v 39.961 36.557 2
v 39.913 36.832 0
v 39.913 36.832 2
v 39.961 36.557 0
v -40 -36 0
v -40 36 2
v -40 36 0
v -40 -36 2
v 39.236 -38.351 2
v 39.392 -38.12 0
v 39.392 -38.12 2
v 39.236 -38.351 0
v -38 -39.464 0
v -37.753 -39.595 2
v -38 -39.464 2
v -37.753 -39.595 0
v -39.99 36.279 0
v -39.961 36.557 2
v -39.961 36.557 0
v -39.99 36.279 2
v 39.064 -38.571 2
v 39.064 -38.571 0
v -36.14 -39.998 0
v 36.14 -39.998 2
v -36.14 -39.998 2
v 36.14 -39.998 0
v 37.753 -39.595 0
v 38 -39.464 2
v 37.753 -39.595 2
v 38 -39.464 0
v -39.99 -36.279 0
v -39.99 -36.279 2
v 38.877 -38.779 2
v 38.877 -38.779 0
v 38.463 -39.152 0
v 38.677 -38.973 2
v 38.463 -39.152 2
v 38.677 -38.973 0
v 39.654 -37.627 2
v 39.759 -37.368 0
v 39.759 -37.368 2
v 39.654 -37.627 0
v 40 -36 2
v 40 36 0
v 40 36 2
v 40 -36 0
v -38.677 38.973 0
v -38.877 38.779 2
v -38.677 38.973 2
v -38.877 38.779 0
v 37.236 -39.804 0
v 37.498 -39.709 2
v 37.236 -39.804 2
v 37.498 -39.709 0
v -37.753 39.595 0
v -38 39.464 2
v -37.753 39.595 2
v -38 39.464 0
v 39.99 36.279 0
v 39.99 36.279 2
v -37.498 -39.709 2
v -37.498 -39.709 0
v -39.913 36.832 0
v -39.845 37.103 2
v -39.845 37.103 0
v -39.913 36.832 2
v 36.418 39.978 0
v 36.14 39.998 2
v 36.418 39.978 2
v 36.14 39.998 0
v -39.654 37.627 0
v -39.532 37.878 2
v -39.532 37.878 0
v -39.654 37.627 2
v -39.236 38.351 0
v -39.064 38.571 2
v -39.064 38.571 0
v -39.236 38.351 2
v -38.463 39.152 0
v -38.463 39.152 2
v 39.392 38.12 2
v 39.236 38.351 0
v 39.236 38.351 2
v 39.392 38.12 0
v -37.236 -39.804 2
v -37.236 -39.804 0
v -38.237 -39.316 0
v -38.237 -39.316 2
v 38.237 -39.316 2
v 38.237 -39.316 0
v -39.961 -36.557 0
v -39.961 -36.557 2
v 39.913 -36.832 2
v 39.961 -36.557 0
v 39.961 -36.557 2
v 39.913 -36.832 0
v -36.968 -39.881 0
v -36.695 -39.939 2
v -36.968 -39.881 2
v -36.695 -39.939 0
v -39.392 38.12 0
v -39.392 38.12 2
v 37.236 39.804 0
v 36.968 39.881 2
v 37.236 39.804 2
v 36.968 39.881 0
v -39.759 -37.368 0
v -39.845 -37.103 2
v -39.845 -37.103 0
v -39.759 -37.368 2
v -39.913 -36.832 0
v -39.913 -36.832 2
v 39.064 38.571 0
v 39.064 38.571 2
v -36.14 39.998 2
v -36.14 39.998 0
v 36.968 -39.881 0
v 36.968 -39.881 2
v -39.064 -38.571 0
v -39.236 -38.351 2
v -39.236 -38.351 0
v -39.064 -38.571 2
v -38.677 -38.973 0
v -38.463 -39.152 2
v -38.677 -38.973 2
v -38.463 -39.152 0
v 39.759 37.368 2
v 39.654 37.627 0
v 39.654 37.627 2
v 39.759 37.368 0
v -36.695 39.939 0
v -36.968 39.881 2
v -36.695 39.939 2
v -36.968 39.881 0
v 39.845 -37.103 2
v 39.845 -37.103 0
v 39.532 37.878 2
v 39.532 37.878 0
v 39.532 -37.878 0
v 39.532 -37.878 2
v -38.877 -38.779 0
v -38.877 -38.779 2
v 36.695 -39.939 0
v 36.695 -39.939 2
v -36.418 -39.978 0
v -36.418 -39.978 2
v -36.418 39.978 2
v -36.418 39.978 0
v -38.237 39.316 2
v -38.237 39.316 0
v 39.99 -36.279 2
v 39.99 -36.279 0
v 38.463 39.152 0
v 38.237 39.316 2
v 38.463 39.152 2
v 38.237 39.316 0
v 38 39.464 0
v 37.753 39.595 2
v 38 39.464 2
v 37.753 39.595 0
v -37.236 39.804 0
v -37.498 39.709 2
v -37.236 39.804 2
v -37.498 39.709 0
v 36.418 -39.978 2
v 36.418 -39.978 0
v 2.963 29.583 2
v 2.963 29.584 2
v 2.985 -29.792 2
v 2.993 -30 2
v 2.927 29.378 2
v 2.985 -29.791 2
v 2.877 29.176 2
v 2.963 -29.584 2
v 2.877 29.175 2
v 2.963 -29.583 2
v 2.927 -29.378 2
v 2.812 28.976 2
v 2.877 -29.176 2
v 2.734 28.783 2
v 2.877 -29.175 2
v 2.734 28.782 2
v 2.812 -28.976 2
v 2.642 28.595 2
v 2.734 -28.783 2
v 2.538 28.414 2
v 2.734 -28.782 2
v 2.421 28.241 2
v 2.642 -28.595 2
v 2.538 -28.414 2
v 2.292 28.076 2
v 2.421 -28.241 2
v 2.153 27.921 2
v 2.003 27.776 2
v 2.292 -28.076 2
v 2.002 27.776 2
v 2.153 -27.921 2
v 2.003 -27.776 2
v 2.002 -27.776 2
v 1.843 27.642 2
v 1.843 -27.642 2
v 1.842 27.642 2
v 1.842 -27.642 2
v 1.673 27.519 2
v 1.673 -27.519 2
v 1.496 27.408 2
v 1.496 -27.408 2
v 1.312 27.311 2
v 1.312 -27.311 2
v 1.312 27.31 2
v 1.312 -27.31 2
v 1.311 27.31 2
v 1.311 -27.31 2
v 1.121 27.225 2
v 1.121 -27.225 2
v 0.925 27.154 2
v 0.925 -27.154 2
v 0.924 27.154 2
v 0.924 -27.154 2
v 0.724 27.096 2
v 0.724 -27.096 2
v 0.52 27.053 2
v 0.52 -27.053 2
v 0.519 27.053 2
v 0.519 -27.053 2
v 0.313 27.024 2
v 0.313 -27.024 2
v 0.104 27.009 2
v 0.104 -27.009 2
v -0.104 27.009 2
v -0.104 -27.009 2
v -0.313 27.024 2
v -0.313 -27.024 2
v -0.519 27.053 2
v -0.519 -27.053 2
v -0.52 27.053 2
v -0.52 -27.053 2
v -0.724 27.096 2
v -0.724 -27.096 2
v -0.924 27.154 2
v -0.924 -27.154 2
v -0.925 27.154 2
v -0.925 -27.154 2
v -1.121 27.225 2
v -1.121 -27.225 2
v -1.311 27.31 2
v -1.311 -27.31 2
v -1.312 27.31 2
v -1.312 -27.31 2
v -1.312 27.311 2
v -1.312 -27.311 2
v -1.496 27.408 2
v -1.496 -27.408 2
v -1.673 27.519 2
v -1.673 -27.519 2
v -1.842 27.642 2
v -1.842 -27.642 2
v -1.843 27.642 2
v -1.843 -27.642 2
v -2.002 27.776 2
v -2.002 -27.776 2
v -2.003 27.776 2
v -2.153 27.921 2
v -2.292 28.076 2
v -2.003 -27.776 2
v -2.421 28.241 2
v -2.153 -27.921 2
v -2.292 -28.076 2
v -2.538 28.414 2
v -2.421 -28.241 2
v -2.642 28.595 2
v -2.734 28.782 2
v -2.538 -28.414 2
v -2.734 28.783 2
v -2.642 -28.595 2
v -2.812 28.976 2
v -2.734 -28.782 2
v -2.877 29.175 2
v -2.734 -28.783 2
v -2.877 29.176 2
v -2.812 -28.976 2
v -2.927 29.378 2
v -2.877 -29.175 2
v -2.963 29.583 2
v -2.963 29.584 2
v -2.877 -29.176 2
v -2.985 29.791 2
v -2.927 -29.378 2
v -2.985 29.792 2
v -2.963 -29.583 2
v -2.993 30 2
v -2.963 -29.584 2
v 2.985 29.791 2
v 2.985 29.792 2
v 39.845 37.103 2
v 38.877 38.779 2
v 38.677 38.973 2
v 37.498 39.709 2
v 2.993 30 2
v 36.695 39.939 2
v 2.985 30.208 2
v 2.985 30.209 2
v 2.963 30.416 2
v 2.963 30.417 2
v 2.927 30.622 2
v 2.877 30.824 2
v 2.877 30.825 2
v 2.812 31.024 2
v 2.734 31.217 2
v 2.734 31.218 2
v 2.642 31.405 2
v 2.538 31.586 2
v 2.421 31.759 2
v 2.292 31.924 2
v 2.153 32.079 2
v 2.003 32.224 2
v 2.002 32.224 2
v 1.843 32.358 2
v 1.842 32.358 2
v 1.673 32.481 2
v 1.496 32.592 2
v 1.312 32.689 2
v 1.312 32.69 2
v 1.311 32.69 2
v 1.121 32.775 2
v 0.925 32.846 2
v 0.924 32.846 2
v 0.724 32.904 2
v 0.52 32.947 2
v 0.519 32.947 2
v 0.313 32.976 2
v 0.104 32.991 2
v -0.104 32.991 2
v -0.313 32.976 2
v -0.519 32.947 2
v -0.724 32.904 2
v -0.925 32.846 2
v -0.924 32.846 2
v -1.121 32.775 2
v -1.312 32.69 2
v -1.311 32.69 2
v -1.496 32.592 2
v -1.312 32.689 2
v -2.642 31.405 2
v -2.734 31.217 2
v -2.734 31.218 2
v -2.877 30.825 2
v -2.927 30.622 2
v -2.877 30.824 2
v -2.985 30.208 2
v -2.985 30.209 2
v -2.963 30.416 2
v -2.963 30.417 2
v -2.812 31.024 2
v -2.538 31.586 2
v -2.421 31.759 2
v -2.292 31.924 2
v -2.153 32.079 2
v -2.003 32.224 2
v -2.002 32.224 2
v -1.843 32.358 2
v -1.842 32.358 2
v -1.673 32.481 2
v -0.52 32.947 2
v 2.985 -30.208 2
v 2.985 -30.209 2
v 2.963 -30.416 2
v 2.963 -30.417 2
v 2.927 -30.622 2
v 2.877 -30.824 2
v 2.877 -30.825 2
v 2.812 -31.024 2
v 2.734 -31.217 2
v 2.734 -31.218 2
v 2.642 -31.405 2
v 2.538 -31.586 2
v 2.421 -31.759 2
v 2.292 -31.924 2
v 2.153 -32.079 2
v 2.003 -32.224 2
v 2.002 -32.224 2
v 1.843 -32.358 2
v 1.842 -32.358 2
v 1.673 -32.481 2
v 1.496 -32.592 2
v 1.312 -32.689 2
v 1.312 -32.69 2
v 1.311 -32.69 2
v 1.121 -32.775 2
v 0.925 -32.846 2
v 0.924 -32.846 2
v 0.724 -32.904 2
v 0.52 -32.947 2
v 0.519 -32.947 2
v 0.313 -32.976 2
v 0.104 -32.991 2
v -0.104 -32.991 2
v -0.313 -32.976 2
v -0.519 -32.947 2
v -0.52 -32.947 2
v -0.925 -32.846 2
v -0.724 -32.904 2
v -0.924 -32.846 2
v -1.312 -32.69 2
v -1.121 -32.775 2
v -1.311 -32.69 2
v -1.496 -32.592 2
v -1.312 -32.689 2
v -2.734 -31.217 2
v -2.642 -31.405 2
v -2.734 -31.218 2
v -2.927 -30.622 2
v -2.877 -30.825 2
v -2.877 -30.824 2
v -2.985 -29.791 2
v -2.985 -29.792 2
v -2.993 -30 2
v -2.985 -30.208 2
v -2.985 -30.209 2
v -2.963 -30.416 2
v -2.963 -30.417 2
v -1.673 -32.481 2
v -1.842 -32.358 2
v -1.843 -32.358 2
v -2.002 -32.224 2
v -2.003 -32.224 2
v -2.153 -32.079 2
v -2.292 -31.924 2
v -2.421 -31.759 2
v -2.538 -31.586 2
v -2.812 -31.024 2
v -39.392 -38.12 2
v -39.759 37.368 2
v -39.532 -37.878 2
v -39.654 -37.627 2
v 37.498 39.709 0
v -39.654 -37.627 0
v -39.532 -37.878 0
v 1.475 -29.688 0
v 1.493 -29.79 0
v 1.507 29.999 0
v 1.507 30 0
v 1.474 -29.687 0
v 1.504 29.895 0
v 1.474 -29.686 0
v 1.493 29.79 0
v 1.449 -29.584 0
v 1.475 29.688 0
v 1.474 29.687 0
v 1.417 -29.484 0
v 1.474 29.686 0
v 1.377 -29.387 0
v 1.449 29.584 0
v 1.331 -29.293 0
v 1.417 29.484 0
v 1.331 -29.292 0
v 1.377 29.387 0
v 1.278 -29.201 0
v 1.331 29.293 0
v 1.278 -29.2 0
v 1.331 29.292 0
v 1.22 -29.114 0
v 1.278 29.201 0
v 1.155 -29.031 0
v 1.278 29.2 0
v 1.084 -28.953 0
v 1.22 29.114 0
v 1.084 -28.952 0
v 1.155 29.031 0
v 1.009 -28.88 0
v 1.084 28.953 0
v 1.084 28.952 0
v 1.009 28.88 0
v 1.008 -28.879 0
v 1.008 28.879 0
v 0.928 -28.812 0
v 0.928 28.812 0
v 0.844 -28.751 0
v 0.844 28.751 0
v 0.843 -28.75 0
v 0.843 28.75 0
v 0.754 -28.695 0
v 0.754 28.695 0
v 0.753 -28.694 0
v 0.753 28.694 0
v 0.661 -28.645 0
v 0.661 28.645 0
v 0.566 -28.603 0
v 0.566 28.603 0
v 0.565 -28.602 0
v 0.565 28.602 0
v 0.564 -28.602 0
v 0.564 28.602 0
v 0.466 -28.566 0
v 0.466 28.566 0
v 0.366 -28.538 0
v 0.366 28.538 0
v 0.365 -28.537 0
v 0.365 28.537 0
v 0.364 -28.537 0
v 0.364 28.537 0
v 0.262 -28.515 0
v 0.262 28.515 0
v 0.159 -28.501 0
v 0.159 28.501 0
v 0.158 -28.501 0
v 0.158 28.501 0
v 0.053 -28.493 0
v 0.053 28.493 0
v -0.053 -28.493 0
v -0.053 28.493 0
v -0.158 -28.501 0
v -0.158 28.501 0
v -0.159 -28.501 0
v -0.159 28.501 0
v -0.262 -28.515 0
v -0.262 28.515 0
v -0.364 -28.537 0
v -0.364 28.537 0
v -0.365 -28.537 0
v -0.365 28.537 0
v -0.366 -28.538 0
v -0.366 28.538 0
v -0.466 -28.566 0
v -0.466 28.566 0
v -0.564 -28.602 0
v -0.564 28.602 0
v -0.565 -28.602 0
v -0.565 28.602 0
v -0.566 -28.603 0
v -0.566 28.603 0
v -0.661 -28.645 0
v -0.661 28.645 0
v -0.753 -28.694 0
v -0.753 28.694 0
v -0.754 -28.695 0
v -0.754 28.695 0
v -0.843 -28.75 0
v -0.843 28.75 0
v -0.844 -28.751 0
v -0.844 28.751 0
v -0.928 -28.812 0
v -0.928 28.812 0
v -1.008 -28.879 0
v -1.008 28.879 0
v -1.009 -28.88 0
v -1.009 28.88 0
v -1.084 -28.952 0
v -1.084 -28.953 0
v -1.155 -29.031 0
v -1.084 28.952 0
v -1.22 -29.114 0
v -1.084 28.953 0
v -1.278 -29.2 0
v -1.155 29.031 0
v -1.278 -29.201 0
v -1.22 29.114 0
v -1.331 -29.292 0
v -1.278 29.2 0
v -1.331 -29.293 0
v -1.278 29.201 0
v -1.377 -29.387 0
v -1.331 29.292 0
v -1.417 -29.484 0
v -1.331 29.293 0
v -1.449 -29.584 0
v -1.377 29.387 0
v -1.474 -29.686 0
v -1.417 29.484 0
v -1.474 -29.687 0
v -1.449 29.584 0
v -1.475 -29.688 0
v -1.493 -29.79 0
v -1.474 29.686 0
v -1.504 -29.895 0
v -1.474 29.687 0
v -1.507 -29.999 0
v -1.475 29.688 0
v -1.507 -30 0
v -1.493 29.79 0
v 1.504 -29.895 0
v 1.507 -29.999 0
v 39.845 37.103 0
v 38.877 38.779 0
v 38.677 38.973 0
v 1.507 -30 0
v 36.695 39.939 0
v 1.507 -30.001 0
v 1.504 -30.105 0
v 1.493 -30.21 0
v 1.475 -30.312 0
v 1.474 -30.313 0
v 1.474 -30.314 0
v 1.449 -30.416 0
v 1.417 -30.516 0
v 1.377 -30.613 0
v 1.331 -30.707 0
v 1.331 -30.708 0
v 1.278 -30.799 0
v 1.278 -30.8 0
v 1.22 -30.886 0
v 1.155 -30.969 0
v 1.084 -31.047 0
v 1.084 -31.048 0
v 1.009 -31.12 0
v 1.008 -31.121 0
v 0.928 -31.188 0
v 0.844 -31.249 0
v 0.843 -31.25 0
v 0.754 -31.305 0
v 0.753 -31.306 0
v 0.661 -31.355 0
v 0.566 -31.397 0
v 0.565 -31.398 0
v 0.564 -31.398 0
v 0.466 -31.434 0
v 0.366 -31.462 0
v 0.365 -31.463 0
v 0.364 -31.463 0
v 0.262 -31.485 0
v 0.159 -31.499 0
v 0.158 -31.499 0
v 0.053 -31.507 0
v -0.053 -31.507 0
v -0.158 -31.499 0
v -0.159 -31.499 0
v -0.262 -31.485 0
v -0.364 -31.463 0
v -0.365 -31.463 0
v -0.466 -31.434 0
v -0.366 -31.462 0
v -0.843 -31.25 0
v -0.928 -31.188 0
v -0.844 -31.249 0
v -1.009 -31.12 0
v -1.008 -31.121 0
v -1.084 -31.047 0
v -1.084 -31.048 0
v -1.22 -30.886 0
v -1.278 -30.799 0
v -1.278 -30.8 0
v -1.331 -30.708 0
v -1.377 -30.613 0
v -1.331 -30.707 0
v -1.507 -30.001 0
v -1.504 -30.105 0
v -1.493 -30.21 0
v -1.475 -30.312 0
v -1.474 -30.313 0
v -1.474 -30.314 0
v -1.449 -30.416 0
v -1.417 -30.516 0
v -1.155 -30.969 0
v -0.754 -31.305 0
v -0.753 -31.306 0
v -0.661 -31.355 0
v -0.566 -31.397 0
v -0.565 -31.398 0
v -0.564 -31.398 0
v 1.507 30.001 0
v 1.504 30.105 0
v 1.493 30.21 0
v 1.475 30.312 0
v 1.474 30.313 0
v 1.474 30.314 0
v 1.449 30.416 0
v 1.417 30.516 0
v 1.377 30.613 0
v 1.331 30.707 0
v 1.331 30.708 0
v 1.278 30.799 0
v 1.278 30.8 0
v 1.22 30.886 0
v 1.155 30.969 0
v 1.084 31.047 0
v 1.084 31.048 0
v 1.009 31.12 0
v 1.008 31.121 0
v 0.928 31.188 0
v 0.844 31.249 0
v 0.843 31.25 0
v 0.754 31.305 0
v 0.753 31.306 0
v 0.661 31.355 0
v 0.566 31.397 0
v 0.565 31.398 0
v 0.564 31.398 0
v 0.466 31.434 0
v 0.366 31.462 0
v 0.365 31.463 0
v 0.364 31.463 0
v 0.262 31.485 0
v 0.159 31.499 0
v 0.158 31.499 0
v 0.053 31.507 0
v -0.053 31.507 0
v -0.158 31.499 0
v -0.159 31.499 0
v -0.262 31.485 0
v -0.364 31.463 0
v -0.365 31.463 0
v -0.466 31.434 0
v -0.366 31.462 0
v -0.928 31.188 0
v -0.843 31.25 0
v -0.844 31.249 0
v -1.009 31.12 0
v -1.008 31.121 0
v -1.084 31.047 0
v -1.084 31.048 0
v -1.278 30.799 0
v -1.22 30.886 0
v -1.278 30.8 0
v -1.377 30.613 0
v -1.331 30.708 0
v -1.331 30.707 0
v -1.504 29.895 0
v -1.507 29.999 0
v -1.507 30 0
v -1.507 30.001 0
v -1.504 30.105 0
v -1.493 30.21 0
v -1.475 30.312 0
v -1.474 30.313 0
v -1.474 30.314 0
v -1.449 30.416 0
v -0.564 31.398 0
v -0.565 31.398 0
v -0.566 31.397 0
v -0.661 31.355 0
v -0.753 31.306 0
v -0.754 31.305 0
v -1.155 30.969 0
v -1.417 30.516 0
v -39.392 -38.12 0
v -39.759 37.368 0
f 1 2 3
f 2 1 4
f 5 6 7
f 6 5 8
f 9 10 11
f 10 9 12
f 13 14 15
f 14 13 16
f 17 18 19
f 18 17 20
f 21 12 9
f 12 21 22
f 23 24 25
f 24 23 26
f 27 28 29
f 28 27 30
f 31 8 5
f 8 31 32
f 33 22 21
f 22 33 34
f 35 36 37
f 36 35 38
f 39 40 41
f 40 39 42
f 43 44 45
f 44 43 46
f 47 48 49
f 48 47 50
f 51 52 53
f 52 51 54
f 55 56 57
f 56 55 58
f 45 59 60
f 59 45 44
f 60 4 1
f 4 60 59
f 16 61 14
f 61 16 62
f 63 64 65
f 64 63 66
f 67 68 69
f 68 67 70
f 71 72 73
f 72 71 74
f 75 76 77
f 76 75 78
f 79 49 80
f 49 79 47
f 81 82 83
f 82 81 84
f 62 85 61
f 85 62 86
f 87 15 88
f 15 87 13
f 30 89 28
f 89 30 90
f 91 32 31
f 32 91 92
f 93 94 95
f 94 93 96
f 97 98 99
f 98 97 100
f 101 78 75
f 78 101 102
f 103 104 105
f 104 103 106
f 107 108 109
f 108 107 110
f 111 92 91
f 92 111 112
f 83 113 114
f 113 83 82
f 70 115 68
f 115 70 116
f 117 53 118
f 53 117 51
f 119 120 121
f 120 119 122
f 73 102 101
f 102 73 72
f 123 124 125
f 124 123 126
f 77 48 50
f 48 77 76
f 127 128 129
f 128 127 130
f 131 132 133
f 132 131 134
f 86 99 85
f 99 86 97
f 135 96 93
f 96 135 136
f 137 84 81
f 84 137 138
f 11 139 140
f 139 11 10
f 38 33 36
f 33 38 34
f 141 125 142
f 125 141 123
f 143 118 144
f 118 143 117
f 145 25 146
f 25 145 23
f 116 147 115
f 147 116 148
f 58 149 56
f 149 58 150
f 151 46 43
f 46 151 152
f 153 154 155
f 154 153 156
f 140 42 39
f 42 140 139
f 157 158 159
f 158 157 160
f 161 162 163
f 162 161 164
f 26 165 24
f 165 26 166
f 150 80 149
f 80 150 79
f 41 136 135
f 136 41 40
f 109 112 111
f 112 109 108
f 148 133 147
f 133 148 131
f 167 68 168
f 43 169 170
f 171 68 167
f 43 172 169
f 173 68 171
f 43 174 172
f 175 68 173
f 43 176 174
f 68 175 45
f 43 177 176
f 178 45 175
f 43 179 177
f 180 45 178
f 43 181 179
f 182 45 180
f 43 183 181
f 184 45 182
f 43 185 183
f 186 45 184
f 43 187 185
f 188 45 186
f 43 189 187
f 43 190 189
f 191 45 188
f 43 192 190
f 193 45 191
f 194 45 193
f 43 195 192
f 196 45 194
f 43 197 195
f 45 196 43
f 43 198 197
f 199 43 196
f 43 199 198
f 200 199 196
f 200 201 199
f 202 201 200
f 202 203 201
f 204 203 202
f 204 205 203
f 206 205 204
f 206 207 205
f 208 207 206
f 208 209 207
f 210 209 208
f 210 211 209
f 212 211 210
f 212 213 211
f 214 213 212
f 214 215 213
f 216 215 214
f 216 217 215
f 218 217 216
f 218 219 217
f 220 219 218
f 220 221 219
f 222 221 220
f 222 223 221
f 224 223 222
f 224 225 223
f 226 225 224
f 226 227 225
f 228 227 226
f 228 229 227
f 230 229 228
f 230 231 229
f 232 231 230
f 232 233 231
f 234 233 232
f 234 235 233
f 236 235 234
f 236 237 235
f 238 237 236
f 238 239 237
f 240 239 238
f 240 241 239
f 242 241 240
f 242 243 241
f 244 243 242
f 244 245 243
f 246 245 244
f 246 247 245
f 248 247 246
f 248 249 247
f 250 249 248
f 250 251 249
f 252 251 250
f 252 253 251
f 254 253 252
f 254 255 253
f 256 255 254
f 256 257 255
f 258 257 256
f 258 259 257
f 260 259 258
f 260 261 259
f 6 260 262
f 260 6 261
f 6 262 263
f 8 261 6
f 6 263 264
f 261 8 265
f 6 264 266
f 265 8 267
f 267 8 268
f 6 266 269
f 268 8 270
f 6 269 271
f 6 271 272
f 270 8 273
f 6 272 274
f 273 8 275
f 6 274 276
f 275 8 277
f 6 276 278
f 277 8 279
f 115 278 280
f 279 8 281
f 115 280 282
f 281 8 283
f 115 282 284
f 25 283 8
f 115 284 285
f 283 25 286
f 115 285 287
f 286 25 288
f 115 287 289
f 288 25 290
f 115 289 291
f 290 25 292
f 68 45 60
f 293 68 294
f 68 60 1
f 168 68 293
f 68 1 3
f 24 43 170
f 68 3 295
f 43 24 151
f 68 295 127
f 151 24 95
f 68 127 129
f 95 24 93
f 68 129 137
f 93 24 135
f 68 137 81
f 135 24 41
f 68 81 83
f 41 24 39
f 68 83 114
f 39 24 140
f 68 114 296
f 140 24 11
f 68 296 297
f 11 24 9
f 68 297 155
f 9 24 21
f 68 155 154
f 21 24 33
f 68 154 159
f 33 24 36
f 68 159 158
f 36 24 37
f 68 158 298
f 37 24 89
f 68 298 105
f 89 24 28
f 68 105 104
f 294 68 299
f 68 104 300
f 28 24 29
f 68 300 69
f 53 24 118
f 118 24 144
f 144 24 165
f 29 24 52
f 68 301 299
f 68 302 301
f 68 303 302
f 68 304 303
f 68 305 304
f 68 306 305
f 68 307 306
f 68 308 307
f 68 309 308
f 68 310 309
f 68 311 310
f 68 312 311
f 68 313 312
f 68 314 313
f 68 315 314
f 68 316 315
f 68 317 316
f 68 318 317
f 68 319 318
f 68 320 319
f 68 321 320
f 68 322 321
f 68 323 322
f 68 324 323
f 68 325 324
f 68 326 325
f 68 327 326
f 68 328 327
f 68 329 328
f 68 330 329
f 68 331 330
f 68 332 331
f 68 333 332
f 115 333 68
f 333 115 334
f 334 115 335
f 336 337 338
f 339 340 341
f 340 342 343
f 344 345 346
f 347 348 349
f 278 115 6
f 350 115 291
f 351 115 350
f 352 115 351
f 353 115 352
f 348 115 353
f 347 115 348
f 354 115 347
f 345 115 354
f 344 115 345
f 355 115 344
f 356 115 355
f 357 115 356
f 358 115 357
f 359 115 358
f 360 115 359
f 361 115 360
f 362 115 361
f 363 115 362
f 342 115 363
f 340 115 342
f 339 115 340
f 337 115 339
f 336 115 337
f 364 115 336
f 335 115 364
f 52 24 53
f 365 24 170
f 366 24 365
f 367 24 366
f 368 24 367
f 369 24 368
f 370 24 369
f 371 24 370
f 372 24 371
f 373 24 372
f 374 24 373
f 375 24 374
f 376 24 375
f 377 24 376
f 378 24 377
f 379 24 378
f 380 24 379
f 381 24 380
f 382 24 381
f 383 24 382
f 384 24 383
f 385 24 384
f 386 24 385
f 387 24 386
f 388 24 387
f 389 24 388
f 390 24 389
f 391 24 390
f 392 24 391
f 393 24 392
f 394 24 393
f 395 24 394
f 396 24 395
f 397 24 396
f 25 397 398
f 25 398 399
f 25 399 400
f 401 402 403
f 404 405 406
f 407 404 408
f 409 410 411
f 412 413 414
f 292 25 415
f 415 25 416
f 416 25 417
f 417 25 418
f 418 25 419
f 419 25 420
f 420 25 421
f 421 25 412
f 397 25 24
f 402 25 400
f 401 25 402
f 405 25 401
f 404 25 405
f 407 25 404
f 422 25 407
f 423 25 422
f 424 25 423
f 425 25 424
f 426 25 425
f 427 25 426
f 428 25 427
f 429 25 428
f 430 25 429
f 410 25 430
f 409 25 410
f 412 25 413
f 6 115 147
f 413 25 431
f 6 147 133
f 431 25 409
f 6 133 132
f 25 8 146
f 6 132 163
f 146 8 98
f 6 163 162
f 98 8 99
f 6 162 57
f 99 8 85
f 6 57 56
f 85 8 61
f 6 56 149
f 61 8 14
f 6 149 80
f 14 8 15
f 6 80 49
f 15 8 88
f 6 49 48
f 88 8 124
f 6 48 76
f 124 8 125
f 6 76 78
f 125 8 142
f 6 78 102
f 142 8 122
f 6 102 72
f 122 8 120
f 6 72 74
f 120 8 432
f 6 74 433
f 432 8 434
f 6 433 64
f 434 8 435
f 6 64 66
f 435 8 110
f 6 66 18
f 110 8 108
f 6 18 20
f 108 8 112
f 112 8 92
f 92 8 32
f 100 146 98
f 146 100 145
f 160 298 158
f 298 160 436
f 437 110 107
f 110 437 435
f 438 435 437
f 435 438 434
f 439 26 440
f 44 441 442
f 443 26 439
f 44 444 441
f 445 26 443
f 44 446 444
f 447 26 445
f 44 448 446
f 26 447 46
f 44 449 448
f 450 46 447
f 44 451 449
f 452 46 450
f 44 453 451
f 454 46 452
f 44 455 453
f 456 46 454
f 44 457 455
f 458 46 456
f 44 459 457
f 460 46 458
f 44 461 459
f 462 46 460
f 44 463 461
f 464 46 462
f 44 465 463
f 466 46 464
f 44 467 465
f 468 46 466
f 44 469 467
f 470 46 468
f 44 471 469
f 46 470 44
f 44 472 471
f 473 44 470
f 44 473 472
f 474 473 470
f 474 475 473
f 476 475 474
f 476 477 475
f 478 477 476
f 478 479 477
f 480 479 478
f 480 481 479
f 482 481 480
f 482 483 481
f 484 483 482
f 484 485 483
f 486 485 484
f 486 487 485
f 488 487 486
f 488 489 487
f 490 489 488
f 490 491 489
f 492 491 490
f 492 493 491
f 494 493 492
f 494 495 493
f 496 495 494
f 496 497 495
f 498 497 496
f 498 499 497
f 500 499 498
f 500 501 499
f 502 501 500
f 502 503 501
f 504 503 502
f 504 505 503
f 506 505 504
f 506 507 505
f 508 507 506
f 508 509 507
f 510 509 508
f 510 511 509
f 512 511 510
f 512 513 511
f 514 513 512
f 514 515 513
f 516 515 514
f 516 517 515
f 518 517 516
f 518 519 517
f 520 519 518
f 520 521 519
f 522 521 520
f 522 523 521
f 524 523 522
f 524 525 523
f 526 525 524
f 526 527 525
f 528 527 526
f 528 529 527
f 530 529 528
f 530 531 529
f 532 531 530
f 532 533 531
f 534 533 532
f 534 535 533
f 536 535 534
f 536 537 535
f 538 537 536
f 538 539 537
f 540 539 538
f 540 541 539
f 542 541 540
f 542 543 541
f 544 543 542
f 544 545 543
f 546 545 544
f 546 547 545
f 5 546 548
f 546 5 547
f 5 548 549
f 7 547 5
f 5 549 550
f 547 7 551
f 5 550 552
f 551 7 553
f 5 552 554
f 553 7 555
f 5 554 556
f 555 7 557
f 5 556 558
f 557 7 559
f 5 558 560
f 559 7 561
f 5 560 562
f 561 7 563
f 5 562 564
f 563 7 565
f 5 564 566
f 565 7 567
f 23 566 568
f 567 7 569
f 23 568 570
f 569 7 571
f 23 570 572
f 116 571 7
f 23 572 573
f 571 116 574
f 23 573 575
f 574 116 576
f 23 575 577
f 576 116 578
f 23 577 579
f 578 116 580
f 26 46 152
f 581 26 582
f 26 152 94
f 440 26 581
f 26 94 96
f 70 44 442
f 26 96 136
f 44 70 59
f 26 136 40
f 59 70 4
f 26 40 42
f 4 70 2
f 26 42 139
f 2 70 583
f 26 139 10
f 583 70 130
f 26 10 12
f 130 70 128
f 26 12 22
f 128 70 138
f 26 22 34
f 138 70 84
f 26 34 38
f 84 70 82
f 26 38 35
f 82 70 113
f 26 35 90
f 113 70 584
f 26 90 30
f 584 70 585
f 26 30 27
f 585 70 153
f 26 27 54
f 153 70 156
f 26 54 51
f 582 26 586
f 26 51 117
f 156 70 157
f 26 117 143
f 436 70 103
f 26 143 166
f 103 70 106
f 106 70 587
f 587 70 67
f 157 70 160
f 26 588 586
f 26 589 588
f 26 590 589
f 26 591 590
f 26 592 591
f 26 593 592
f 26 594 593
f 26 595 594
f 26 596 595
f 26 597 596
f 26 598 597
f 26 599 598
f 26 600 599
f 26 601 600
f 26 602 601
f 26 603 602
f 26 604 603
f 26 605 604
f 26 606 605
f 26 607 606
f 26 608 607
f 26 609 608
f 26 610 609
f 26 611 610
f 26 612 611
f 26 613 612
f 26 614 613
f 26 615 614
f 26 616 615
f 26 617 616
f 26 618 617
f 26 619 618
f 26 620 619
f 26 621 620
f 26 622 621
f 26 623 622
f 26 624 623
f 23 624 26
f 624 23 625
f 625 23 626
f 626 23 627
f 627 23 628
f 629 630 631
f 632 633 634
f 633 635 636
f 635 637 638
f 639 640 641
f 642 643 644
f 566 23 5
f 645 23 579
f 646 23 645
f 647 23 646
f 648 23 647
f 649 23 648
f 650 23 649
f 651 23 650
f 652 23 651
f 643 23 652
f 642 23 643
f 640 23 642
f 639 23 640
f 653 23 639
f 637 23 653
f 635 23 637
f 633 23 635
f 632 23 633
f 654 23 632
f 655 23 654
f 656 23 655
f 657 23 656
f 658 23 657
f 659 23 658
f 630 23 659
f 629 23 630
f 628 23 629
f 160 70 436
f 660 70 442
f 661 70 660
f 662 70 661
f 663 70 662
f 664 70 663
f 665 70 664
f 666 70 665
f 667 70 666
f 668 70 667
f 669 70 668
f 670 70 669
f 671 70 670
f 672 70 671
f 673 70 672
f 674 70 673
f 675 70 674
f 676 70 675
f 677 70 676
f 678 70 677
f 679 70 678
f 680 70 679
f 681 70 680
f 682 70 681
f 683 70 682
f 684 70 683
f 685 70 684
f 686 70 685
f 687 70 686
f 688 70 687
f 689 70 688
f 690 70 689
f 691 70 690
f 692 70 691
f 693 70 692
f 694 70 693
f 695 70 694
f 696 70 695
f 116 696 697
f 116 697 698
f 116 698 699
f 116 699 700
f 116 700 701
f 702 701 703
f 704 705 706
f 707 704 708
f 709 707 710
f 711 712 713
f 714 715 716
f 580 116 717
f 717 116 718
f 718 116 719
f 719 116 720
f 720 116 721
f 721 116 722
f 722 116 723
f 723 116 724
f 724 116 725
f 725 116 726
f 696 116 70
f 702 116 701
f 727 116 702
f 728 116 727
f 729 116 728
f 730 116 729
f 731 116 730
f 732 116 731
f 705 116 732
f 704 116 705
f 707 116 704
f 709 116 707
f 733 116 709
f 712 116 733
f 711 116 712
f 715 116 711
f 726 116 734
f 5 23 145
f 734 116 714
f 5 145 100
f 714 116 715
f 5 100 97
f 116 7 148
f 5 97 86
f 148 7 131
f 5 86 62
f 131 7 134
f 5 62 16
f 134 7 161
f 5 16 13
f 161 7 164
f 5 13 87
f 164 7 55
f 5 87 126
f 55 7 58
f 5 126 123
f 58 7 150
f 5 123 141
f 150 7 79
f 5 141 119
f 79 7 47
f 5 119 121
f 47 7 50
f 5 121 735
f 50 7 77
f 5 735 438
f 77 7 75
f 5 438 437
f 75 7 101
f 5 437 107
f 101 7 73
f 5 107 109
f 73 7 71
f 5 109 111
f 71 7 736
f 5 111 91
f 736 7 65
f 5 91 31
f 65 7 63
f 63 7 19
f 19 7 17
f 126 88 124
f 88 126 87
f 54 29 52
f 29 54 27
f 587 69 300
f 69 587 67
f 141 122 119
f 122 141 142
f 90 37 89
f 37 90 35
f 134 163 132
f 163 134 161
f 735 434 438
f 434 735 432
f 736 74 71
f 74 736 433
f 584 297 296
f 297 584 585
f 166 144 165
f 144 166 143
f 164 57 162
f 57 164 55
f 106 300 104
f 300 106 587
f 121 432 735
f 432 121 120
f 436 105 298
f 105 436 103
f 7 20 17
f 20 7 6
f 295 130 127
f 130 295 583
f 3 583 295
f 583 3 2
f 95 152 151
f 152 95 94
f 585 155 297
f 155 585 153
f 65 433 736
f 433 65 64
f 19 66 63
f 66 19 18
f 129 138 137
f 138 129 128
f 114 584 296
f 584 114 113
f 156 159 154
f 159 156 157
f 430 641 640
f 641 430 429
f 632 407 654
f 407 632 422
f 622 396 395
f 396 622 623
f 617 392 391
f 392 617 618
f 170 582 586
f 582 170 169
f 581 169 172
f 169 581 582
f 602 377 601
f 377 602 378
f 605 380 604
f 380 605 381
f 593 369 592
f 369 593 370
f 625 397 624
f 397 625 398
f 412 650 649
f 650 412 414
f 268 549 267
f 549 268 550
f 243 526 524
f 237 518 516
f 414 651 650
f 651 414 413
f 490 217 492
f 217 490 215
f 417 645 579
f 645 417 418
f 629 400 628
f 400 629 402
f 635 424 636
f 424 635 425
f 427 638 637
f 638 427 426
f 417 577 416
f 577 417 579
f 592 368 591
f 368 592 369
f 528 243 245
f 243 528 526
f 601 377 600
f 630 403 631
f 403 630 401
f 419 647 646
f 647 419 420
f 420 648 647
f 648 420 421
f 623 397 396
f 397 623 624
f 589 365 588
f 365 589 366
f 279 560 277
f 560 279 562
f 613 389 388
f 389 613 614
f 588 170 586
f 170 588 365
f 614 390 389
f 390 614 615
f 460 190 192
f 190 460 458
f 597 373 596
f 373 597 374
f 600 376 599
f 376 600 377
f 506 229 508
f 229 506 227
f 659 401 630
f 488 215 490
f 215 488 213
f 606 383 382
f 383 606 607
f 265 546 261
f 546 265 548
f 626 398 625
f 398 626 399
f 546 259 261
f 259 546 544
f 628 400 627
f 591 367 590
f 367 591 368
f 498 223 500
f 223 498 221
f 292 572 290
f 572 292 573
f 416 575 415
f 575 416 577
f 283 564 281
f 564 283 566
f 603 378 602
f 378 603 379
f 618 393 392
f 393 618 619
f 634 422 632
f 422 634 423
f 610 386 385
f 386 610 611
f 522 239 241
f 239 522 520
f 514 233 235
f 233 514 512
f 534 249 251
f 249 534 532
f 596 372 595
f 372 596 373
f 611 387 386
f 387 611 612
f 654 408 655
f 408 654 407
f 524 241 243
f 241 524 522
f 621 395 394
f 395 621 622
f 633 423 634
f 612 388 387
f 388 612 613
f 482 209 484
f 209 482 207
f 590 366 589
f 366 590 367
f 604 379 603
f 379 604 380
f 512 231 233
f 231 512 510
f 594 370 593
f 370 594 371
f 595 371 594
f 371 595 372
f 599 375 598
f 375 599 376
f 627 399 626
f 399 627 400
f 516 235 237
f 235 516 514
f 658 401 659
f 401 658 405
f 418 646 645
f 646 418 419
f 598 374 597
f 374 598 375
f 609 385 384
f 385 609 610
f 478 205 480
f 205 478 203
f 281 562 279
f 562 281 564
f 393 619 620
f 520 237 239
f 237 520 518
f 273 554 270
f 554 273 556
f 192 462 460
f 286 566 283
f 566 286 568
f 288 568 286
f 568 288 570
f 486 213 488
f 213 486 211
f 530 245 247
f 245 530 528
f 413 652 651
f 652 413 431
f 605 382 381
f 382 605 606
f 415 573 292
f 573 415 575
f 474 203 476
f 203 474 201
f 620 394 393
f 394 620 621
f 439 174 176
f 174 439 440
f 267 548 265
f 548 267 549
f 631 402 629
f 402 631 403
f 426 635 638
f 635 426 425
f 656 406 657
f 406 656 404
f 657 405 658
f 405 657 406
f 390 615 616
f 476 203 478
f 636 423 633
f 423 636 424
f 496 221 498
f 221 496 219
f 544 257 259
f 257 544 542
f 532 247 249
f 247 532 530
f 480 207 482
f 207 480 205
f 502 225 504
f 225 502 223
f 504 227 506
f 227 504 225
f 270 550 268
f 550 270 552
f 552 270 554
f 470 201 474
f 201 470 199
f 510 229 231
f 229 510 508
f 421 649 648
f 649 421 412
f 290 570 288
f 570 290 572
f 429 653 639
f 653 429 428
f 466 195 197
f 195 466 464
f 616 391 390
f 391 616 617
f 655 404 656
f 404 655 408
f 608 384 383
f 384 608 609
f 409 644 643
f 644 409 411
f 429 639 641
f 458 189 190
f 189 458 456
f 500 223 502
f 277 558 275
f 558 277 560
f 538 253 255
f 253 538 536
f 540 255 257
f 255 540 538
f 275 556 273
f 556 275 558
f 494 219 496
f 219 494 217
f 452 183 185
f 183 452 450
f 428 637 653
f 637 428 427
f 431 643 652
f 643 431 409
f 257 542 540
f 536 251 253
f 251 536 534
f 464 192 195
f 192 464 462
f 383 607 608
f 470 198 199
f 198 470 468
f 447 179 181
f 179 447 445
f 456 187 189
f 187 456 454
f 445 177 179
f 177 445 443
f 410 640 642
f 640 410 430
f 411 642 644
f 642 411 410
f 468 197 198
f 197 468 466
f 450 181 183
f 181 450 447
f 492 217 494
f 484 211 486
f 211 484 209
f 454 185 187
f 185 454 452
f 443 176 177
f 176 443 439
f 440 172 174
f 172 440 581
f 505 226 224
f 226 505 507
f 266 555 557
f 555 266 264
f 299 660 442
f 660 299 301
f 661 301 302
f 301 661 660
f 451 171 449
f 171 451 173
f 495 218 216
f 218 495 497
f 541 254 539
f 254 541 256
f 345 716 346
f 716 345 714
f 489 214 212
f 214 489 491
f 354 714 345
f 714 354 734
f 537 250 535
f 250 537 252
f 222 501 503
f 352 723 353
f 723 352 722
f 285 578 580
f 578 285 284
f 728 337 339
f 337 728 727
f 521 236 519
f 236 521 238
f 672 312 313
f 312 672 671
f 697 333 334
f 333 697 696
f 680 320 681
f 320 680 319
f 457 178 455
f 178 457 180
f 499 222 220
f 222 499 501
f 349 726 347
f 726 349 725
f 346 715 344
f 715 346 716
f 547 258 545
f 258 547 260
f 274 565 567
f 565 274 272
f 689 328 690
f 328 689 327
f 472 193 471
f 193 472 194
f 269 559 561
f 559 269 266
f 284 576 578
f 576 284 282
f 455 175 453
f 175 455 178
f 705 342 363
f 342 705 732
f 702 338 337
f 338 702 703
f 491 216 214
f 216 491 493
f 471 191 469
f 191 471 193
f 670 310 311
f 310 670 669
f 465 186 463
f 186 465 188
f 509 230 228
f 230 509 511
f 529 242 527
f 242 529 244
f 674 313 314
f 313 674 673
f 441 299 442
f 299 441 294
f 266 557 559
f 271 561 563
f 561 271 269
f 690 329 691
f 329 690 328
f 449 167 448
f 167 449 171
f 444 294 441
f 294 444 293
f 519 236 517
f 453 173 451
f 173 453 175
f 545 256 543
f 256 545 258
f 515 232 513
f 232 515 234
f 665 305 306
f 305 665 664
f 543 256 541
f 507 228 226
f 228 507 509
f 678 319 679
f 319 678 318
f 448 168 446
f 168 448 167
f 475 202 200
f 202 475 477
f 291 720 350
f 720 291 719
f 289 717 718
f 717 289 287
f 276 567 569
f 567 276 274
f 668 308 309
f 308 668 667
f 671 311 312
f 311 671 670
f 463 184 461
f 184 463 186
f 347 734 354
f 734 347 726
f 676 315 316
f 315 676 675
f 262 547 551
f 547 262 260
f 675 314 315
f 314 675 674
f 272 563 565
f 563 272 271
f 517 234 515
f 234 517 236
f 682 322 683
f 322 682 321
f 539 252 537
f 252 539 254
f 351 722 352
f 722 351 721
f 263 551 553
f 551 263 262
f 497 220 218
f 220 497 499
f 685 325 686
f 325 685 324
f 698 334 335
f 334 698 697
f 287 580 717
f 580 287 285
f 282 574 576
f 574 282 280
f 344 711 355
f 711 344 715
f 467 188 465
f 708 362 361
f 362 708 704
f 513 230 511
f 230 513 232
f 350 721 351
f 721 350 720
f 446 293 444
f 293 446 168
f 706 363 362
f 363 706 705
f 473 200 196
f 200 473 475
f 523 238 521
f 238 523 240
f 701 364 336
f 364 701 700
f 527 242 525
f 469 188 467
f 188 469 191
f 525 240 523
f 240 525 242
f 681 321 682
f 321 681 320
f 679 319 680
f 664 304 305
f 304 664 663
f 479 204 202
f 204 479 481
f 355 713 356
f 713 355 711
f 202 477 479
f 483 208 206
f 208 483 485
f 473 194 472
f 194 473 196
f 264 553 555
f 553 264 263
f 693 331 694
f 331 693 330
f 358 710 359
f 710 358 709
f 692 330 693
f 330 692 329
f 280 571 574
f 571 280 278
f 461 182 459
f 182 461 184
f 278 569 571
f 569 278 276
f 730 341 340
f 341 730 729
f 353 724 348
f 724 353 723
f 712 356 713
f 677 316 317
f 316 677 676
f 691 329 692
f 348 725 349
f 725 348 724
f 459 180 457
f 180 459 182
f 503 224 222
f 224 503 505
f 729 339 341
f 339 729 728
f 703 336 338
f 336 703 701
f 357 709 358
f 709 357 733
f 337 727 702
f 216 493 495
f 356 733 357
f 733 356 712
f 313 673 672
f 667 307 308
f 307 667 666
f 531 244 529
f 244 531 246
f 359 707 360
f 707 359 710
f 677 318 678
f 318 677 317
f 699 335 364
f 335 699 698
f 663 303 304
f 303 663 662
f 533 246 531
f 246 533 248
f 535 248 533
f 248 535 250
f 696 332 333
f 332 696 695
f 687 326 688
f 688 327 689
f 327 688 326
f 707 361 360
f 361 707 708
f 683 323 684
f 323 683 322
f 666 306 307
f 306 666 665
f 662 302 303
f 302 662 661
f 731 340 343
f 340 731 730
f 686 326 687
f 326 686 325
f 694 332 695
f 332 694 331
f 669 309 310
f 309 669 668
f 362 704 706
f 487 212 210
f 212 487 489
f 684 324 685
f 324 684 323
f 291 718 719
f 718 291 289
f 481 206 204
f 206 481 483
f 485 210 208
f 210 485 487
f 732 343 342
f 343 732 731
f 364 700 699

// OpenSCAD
$fn=90;

l = 80;
r = 4;
h = 2;

la = 60;

eps = 0.01;

module deckel() {
    linear_extrude(height = h)
    minkowski() {
        square(l - r*2, center=true);
        circle(r);
    }
}

module loch() {
    translate([0, 0, -eps])
    cylinder(h = h + 2 * eps, r1 = 1.5, r2 = 3);
}

difference() {
    deckel();
    translate([0, -la/2, 0]) loch();
    translate([0, la/2, 0]) loch();
}
